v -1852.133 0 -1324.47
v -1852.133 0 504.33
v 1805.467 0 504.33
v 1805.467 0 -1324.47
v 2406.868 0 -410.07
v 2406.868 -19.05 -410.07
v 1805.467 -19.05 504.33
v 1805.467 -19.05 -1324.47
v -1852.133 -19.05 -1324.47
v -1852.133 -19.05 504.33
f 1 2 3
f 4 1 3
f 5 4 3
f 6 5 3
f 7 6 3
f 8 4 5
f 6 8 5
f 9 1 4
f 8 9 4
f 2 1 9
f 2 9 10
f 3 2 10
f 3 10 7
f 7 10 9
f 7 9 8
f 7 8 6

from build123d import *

# Parameters (mm, degrees)
F0_W     = 3657.6
F0_H     = 1828.8
F1_DEPTH = 19.05


with BuildPart() as f1:
    # F0 (on Front) → F1 (new body)
    with BuildSketch(Plane.XZ):
        Polygon((2406.868458, -410.069519), (1805.467397, 504.330481), (1805.467397, -1324.469519), align=None)
        with Locations((-23.332603, -410.069519)):
            Rectangle(F0_W, F0_H)
    extrude(amount=F1_DEPTH)


solid = f1.part
